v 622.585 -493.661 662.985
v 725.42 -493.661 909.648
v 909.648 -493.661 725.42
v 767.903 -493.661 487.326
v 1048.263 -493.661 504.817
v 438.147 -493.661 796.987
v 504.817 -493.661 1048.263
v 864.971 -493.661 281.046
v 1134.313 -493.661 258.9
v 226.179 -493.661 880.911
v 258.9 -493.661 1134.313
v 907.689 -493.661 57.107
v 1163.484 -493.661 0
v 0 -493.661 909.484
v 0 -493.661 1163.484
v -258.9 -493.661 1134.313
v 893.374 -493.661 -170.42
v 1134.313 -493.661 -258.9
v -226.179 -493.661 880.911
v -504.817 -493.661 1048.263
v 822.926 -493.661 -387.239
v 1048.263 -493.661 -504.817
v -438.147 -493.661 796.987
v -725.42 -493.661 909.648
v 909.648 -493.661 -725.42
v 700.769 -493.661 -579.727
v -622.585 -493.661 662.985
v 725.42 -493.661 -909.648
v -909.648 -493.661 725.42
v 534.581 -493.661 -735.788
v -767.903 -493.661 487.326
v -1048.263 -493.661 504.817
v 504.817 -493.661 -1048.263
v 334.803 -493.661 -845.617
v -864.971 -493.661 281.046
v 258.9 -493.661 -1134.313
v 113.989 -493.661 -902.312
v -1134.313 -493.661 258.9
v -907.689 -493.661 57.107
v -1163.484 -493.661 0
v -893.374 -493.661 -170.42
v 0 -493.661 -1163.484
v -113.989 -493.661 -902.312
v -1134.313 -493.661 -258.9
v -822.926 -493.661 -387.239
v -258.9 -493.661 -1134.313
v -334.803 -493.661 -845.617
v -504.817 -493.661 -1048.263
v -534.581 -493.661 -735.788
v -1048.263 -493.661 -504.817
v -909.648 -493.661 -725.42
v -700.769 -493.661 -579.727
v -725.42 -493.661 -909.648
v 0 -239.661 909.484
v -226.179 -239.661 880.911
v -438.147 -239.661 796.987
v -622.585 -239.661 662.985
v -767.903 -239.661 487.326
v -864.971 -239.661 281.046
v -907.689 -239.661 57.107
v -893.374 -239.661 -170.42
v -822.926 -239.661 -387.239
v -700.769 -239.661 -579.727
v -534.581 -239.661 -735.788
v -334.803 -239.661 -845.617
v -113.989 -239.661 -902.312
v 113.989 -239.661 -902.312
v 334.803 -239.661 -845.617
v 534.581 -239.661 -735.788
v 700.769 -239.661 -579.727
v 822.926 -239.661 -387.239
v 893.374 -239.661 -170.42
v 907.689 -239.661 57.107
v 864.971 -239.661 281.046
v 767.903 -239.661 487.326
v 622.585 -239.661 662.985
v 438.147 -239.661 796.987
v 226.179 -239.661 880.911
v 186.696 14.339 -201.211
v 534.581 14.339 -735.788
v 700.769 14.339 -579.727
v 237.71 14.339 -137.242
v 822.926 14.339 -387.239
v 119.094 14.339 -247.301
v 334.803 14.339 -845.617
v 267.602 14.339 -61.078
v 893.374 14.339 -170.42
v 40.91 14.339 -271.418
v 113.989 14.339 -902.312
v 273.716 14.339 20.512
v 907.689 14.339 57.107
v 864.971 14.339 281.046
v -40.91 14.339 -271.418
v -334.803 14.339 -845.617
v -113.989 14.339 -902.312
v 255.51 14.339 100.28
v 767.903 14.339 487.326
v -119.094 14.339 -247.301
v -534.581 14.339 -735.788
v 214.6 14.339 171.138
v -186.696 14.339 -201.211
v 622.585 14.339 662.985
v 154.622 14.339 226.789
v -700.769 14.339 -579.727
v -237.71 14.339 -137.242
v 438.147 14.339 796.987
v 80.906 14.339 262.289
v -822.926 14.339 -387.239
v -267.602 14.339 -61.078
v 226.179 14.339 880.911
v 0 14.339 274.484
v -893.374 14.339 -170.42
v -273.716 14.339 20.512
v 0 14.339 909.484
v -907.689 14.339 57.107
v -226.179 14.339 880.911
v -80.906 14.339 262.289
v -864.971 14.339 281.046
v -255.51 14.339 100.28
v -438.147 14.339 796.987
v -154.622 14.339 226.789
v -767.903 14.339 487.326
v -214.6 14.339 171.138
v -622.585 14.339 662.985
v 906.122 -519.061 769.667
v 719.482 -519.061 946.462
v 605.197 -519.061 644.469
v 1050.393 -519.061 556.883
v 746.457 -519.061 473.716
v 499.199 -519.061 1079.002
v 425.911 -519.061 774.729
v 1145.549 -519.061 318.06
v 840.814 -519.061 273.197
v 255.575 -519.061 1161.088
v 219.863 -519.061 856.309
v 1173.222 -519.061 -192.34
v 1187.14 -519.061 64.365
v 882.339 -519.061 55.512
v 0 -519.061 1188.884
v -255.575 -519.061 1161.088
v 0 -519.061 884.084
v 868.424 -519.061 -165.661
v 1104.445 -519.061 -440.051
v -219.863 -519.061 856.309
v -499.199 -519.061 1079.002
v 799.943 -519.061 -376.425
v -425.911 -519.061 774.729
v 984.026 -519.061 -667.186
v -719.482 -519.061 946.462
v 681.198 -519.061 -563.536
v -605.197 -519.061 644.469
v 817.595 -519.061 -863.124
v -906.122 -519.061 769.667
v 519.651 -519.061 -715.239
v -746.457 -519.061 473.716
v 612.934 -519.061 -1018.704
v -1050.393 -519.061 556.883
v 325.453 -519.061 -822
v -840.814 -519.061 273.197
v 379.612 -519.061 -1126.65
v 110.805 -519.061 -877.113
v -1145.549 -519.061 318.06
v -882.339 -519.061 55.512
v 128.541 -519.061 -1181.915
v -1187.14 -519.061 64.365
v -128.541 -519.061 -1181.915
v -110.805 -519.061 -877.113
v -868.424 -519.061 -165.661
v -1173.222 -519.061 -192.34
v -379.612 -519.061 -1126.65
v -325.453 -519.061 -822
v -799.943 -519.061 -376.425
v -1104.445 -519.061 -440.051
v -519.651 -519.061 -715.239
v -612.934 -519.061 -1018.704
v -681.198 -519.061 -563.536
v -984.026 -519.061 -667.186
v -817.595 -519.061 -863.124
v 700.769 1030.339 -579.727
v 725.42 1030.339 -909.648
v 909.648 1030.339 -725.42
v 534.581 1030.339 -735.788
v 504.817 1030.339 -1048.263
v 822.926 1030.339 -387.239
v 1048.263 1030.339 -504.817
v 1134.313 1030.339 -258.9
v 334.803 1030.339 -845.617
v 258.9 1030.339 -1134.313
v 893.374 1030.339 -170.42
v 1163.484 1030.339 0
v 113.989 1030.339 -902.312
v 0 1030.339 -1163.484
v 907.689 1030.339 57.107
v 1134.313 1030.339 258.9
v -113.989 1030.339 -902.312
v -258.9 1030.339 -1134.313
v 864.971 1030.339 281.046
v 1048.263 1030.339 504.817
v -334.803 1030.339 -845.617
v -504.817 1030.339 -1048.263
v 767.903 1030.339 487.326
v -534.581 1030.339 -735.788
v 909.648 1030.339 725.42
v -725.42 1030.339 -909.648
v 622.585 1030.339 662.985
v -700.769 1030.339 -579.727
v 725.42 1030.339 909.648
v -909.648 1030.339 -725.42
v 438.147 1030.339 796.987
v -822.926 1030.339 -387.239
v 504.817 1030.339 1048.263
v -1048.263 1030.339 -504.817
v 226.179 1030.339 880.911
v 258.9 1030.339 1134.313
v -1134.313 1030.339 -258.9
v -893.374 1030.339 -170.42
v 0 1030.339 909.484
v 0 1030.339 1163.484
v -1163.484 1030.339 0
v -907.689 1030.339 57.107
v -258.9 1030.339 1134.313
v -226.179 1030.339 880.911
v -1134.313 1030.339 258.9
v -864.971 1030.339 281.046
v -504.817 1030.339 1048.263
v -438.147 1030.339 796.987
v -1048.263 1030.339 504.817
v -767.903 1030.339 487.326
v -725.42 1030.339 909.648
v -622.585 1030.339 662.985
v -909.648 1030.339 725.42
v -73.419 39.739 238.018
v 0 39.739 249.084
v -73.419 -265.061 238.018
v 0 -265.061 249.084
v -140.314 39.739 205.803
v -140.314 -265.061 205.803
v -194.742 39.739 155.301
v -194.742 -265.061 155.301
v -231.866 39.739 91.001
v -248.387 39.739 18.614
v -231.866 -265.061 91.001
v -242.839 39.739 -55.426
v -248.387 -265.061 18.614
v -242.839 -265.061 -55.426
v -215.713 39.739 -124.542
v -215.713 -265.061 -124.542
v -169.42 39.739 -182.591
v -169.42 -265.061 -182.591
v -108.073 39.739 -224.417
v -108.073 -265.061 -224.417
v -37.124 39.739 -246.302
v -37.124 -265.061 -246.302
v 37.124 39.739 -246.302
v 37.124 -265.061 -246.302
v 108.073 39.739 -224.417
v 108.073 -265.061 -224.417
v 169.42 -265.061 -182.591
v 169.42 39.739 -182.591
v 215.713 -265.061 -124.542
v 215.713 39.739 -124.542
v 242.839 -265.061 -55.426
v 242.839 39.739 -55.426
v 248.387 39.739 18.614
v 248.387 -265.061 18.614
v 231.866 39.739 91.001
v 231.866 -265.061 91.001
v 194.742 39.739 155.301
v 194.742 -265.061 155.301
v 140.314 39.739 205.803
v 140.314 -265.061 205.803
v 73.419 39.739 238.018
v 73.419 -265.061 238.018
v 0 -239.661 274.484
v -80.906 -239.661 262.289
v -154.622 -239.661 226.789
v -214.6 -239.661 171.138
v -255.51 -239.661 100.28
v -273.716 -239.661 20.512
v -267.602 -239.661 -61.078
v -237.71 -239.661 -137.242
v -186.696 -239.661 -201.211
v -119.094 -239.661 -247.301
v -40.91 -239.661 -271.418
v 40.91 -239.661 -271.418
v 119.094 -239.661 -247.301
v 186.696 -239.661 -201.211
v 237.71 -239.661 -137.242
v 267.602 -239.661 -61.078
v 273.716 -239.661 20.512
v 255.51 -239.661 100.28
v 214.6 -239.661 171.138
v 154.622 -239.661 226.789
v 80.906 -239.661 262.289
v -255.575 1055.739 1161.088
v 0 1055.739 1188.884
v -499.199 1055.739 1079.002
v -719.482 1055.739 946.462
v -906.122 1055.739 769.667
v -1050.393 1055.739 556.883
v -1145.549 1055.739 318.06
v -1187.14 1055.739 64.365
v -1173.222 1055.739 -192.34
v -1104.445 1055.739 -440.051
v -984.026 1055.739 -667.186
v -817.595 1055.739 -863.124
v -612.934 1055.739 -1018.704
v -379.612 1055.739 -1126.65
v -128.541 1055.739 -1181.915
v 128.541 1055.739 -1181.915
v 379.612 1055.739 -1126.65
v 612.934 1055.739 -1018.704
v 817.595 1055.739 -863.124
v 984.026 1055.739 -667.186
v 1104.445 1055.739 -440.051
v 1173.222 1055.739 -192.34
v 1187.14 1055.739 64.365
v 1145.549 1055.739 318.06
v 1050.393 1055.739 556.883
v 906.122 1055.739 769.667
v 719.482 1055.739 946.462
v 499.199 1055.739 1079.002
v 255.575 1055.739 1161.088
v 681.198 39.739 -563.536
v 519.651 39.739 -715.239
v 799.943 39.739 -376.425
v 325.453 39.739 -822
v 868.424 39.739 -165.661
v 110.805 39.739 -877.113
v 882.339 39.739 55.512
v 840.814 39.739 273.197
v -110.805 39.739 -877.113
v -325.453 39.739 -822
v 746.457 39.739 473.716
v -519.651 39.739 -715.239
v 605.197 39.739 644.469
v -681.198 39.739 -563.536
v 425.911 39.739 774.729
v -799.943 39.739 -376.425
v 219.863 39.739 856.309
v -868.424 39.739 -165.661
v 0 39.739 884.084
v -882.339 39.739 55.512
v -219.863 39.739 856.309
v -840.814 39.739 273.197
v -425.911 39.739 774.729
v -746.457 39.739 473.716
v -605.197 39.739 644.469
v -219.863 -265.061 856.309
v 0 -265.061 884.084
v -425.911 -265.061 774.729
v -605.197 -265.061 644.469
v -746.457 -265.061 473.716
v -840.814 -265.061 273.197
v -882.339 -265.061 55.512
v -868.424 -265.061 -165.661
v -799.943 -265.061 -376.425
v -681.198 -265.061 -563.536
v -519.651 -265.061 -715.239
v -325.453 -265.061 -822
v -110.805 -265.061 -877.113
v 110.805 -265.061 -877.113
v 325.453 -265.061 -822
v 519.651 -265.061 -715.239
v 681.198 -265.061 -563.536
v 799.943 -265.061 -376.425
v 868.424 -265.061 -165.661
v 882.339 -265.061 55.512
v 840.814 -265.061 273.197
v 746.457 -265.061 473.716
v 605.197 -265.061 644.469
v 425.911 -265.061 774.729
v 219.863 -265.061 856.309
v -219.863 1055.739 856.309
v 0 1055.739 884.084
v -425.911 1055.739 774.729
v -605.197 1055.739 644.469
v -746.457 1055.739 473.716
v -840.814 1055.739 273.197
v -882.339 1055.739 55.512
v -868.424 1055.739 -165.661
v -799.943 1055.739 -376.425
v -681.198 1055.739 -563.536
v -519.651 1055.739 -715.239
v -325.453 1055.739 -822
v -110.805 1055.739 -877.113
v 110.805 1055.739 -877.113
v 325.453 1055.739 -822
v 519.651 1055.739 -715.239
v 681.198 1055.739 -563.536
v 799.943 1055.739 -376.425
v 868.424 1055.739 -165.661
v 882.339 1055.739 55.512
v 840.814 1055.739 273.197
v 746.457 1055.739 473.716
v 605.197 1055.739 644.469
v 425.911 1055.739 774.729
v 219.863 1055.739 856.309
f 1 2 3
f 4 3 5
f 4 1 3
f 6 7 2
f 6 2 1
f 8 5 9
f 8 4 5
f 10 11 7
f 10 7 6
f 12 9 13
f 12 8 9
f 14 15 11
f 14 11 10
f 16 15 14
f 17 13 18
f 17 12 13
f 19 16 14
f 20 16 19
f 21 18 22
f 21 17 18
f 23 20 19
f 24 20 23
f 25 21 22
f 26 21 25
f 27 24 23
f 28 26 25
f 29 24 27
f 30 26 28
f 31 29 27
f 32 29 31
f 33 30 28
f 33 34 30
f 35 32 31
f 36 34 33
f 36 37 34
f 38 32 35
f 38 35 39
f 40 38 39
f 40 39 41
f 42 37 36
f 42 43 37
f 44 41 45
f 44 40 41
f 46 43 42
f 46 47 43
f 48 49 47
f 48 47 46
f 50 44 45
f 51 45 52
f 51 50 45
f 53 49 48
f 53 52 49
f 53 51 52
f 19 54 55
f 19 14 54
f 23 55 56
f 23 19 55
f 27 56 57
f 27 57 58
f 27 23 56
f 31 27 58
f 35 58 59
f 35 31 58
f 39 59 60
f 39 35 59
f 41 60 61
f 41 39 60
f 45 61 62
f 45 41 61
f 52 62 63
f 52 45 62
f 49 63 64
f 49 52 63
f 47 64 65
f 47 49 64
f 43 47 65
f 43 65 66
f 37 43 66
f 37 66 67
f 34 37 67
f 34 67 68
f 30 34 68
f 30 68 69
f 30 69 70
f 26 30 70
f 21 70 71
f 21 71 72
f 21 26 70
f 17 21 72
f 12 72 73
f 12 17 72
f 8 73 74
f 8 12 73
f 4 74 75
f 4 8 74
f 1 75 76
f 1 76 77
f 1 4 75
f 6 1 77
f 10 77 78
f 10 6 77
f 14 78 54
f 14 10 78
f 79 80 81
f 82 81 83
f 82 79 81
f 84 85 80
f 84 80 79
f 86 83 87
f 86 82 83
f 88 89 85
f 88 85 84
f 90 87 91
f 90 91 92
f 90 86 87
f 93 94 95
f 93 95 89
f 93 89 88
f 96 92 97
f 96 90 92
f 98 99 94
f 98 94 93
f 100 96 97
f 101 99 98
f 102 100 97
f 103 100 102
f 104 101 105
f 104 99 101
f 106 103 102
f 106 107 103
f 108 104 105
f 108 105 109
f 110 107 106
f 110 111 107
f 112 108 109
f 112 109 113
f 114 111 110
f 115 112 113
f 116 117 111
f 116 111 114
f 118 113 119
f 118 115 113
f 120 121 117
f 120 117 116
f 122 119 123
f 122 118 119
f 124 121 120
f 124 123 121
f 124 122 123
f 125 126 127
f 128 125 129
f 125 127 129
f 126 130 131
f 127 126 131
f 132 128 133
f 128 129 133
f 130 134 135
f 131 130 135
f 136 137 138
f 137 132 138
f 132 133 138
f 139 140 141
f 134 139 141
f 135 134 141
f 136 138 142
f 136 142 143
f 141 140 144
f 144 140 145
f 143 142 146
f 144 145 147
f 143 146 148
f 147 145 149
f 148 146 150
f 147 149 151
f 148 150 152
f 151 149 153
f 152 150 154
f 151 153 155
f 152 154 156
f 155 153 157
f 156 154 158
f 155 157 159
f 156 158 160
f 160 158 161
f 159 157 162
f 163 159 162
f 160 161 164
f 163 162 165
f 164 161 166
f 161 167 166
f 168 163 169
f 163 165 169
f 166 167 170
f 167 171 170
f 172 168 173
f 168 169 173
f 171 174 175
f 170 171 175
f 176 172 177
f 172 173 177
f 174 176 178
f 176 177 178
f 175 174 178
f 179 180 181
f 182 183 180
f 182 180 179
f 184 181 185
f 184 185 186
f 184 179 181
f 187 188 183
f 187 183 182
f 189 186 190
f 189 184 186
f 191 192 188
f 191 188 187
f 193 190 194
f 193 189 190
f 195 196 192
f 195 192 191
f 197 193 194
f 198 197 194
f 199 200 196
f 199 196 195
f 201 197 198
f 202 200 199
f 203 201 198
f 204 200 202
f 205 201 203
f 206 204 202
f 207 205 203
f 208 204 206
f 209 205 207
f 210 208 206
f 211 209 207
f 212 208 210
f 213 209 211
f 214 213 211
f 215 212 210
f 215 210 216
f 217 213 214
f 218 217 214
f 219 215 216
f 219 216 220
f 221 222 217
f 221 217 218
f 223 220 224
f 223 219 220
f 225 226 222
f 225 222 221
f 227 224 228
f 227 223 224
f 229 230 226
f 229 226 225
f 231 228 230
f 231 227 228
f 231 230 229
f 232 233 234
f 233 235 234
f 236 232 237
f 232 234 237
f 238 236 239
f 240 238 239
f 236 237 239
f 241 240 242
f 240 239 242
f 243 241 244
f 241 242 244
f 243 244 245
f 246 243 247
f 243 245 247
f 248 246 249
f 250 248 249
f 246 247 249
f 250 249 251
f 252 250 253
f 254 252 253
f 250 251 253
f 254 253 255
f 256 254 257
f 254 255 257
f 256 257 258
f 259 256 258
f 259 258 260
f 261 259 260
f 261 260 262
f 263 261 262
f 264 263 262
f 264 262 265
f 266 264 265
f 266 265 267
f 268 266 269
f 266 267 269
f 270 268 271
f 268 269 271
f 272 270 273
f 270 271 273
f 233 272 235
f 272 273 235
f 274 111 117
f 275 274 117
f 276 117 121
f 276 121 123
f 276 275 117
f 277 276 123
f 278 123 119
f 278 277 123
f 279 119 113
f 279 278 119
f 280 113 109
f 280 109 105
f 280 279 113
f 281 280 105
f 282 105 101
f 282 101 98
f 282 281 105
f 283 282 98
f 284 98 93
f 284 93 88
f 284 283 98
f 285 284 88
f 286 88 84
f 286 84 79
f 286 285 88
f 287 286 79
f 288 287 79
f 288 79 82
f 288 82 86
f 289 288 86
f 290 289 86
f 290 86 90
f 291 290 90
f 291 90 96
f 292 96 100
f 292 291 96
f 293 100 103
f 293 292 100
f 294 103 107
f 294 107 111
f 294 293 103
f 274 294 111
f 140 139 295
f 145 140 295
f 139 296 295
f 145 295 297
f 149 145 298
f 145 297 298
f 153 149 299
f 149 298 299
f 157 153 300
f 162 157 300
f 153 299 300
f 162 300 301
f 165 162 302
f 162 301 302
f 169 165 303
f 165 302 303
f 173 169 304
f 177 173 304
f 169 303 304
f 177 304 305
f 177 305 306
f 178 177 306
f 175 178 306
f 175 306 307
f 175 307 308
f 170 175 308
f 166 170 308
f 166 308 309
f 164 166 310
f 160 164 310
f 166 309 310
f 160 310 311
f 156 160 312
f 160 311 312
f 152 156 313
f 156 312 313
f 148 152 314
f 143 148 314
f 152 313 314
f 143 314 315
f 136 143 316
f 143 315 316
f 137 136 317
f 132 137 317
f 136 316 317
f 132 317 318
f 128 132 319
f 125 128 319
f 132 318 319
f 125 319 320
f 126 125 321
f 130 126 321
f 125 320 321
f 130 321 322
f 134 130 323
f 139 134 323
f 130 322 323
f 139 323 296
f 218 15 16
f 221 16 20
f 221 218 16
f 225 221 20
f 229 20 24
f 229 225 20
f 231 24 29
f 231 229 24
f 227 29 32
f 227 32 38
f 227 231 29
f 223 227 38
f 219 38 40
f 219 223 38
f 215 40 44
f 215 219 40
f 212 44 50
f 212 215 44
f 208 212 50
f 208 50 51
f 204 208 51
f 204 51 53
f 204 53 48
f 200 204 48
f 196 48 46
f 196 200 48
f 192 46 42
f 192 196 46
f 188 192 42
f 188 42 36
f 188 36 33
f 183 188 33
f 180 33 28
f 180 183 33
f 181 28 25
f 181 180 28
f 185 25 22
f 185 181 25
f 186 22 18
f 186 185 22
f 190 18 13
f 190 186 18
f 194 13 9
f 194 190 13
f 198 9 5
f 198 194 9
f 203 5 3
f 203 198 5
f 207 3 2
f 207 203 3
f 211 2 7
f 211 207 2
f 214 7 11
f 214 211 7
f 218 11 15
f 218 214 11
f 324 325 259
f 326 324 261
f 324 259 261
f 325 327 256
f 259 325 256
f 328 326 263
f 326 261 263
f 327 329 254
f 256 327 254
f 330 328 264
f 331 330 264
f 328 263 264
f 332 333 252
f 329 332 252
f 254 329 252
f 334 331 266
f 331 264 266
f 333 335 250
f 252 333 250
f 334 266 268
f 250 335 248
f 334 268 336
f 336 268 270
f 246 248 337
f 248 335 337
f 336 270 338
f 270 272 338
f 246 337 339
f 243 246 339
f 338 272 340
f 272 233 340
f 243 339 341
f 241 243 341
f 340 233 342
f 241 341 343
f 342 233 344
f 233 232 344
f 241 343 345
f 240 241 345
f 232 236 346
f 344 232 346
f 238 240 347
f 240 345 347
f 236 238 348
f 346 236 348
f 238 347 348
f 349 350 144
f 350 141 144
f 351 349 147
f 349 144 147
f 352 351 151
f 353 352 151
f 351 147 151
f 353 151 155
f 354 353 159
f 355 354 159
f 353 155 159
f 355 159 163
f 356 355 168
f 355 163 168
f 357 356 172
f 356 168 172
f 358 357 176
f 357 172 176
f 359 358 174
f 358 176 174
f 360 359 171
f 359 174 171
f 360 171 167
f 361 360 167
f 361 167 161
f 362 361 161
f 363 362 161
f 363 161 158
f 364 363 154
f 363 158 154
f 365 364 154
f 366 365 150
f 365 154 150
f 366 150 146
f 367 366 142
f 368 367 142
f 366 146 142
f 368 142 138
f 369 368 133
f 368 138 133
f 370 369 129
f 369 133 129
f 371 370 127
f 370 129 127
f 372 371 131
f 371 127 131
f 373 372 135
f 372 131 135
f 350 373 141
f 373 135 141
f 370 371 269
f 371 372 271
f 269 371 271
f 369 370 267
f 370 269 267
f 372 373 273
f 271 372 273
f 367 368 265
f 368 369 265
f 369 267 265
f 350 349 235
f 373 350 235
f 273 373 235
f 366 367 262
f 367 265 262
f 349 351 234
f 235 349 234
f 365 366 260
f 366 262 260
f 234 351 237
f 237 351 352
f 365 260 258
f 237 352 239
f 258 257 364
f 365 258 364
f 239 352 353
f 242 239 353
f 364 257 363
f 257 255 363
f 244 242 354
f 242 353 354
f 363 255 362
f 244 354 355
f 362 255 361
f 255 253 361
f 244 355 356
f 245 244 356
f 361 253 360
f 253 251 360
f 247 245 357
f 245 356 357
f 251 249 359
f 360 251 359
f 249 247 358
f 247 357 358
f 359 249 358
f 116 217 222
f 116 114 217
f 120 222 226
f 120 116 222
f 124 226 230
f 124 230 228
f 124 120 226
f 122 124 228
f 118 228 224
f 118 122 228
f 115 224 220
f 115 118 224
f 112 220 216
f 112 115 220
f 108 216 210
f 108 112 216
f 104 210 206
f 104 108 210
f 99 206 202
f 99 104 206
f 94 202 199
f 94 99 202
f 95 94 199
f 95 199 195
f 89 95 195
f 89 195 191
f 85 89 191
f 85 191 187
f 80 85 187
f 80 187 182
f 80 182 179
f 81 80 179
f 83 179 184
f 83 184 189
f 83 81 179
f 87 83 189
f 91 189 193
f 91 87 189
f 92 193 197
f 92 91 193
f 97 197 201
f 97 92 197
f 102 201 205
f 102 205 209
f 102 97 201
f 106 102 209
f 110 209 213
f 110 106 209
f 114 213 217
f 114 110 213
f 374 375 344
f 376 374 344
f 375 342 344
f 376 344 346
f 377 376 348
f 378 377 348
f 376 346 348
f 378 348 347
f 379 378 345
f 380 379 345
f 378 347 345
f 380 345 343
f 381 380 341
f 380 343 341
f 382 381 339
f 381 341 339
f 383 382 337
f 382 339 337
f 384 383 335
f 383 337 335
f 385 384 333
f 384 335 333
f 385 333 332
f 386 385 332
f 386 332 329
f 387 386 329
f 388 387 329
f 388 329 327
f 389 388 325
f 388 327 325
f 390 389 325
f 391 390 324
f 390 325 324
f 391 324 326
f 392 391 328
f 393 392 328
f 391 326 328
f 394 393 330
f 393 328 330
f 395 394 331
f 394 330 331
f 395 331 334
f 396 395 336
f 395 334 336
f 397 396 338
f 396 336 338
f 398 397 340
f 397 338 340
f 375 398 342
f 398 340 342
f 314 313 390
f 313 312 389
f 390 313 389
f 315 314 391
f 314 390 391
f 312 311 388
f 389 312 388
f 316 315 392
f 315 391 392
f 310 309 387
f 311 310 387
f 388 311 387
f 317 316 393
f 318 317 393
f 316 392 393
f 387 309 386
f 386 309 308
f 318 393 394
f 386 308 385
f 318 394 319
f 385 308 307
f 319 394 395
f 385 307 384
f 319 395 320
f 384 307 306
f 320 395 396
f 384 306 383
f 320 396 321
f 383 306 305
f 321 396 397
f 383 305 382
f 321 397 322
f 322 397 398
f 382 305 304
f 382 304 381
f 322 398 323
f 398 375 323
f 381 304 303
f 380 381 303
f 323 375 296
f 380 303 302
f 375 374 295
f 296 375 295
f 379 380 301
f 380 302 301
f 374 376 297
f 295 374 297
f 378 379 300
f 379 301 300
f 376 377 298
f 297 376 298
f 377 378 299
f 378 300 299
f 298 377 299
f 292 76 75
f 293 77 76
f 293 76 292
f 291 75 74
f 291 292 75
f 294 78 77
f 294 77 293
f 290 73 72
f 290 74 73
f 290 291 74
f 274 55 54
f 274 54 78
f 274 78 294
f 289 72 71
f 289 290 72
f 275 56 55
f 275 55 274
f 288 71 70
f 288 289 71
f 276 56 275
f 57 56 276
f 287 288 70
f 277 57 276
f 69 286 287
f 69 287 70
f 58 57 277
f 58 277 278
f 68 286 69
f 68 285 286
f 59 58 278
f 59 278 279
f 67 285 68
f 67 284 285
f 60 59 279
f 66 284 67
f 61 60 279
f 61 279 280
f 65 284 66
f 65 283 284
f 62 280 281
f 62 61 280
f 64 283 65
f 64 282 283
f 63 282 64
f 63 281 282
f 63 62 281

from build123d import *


with BuildPart() as part:
    # Sketch1 → Revolve-Thin1 (revolve)
    with BuildSketch(Plane.XY, mode=Mode.PRIVATE) as revolve_thin1_sk:
        Polygon((249.083870968, 39.738709677), (249.083870968, -265.061290323), (884.083870968, -265.061290323), (884.083870968, -519.061290323), (1188.883870968, -519.061290323), (1188.883870968, 1055.738709677), (884.083870968, 1055.738709677), (884.083870968, 39.738709677), align=None)
        Polygon((274.483870968, 14.338709677), (274.483870968, -239.661290323), (909.483870968, -239.661290323), (909.483870968, -493.661290323), (1163.483870968, -493.661290323), (1163.483870968, 1030.338709677), (909.483870968, 1030.338709677), (909.483870968, 14.338709677), align=None, mode=Mode.SUBTRACT)
    revolve(revolve_thin1_sk.sketch.rotate(Axis((0, 989.370967742, 0), (0, -1, 0)), 90), axis=Axis((0, 989.370967742, 0), (0, -1, 0)))


solid = part.part
